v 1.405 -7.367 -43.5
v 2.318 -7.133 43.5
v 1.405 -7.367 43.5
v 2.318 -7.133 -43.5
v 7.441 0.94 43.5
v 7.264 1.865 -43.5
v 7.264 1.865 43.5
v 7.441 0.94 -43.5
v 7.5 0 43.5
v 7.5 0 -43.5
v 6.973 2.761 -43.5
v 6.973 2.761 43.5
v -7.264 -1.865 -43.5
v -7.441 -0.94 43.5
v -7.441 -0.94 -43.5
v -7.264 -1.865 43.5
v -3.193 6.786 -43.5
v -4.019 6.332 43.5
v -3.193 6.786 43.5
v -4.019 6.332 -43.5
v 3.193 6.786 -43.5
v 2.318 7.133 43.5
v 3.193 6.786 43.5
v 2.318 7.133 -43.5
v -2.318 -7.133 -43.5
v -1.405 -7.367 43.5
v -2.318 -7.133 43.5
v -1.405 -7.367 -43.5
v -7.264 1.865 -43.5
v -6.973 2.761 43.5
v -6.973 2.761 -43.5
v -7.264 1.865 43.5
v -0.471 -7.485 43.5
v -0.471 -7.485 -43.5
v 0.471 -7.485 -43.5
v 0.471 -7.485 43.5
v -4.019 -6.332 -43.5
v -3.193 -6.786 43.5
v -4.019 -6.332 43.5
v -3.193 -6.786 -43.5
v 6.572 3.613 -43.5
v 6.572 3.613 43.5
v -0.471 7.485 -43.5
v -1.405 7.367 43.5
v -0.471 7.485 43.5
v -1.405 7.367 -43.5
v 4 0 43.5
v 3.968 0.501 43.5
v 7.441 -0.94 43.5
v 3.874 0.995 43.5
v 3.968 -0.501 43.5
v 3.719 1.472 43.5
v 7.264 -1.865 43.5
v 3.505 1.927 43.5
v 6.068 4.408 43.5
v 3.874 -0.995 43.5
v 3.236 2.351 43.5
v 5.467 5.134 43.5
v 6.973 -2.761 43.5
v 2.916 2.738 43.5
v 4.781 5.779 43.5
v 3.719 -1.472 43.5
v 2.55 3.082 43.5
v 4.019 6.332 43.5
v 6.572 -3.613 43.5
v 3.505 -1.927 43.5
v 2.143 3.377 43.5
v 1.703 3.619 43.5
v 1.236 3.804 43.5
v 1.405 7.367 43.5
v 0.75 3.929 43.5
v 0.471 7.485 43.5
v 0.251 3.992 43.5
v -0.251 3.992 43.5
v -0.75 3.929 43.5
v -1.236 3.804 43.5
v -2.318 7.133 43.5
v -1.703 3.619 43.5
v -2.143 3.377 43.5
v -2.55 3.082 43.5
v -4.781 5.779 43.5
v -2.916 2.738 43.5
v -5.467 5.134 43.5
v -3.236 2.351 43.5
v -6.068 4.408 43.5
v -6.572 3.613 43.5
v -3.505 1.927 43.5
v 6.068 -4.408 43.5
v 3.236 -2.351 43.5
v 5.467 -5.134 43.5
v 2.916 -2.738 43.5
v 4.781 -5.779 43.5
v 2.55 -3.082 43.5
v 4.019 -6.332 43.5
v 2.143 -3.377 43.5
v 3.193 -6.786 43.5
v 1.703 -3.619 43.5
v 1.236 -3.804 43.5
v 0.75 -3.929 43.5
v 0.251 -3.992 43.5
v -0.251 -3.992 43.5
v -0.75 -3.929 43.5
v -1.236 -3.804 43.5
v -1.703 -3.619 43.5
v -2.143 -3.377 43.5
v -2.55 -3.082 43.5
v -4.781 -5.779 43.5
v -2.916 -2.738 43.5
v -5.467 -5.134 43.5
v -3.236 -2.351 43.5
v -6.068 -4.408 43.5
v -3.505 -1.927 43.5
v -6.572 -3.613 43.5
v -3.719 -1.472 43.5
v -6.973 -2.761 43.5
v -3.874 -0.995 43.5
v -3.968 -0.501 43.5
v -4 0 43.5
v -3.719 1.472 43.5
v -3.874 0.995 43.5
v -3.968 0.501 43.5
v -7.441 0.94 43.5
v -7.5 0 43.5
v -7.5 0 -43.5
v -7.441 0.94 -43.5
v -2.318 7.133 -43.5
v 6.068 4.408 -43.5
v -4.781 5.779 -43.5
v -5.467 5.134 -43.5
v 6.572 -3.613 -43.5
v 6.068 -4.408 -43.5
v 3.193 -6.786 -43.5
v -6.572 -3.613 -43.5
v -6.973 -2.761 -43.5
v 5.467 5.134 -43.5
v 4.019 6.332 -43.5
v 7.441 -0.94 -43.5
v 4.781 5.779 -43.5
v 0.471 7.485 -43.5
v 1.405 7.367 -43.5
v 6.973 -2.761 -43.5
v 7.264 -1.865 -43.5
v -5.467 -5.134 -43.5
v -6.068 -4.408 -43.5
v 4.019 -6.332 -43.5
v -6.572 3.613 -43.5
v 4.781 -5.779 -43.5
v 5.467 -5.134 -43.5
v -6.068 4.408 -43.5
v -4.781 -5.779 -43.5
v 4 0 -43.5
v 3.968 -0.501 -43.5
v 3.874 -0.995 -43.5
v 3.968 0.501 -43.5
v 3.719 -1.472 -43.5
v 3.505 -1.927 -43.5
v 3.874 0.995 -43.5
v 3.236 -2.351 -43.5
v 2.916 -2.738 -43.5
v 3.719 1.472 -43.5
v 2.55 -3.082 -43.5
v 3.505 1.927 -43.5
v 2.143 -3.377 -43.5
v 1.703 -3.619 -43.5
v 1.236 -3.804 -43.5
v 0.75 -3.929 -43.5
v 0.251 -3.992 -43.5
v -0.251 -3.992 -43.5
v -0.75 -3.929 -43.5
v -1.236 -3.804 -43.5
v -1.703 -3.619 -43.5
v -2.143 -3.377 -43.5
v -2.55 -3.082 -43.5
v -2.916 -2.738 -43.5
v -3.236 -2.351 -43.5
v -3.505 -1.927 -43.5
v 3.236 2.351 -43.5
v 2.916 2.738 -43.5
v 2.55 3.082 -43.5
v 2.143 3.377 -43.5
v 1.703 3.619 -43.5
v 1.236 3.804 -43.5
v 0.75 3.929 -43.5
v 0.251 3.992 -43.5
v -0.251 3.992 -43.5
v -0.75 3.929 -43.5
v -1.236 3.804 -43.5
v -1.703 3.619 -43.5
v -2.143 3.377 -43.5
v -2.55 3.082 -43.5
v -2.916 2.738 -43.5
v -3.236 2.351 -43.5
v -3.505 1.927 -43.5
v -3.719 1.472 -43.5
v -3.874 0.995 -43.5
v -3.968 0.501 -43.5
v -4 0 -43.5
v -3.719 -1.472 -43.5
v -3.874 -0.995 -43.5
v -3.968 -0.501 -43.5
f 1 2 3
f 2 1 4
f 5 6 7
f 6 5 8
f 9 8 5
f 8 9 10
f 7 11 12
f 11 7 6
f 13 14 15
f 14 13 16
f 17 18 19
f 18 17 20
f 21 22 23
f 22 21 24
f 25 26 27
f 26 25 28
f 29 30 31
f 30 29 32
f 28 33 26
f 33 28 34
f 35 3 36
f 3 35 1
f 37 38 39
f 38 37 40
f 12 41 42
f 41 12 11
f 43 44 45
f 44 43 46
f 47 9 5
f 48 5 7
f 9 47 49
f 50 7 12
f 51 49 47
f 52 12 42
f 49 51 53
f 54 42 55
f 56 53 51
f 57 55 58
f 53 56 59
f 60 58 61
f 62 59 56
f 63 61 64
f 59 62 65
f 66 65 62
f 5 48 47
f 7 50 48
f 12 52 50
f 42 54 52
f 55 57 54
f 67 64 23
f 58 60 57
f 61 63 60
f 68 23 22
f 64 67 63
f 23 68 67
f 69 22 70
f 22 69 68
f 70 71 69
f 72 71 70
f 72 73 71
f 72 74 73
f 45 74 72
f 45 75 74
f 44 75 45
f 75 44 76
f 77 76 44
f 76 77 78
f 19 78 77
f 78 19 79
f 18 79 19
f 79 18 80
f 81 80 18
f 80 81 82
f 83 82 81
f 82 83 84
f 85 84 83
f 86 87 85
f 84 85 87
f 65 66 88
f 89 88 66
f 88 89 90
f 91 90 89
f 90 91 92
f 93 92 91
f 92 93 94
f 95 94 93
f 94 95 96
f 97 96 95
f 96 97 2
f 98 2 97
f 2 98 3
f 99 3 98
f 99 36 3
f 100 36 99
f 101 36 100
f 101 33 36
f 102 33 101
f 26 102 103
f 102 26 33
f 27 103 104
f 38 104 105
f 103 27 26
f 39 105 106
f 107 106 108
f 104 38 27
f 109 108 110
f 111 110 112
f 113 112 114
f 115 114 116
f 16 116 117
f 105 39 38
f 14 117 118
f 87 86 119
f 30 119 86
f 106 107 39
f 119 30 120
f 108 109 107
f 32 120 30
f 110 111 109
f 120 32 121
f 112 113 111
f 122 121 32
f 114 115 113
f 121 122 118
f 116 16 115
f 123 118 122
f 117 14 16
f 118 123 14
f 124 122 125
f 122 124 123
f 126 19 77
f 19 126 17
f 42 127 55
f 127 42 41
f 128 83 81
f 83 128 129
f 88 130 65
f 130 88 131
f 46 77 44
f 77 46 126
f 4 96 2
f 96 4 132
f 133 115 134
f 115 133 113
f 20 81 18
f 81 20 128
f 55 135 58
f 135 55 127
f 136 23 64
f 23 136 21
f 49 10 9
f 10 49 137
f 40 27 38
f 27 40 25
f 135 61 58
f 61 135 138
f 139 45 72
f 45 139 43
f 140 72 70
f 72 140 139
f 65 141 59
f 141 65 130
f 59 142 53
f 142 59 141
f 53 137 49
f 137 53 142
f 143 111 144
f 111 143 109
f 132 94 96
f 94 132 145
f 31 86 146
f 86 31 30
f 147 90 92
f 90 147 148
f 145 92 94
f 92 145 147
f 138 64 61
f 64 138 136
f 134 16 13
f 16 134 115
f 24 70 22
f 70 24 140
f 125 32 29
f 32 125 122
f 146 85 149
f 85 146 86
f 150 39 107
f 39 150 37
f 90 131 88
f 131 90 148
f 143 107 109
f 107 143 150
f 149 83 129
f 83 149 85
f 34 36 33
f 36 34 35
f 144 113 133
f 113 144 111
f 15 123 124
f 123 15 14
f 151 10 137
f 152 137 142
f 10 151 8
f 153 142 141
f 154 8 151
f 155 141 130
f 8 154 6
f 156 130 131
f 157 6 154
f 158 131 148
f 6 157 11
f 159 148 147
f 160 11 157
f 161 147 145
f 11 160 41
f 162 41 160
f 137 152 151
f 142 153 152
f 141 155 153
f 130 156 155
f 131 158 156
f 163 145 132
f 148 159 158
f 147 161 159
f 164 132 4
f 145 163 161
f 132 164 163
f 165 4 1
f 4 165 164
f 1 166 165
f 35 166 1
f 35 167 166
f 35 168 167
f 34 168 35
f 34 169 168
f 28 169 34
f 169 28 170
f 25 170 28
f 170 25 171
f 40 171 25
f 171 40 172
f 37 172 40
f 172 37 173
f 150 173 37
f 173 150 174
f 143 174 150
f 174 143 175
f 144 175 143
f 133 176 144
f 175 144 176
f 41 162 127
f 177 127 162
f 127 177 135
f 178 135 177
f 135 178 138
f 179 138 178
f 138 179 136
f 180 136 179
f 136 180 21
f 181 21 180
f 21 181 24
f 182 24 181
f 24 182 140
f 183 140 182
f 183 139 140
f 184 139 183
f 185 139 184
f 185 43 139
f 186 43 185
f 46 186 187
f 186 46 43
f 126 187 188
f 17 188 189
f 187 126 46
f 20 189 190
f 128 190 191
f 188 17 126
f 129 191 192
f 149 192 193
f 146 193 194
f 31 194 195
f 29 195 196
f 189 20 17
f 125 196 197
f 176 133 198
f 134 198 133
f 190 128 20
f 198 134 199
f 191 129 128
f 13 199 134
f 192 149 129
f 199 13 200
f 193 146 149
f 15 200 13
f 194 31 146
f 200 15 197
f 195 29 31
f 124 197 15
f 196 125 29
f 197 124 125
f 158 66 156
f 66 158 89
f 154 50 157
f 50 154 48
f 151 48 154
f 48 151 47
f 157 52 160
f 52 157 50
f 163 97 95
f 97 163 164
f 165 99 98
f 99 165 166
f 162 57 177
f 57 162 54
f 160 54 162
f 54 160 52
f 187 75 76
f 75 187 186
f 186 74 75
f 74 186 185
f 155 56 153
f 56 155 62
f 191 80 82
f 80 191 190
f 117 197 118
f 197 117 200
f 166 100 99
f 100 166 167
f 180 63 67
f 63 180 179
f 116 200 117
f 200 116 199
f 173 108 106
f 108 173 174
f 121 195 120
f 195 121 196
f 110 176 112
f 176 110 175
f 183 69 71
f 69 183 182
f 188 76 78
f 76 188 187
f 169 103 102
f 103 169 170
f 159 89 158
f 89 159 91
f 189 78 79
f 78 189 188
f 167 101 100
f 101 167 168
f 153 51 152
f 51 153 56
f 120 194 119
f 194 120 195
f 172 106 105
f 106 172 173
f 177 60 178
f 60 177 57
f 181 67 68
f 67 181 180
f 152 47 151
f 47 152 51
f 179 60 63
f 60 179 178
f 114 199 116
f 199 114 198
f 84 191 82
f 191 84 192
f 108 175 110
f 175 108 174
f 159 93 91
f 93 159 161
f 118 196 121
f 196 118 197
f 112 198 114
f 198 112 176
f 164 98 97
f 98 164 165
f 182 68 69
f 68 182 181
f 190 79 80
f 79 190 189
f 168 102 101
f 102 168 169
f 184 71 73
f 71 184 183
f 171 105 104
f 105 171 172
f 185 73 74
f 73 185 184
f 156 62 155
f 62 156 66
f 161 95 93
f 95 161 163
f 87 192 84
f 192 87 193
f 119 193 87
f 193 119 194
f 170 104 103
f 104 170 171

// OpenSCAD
$fn = 50;


difference() {
	union() {
		translate(v = [0, 0, -43.5000000000]) {
			cylinder(h = 87, r = 7.5000000000);
		}
	}
	union() {
		translate(v = [0, 0, -100.0000000000]) {
			cylinder(h = 200, r = 4.0000000000);
		}
	}
}
